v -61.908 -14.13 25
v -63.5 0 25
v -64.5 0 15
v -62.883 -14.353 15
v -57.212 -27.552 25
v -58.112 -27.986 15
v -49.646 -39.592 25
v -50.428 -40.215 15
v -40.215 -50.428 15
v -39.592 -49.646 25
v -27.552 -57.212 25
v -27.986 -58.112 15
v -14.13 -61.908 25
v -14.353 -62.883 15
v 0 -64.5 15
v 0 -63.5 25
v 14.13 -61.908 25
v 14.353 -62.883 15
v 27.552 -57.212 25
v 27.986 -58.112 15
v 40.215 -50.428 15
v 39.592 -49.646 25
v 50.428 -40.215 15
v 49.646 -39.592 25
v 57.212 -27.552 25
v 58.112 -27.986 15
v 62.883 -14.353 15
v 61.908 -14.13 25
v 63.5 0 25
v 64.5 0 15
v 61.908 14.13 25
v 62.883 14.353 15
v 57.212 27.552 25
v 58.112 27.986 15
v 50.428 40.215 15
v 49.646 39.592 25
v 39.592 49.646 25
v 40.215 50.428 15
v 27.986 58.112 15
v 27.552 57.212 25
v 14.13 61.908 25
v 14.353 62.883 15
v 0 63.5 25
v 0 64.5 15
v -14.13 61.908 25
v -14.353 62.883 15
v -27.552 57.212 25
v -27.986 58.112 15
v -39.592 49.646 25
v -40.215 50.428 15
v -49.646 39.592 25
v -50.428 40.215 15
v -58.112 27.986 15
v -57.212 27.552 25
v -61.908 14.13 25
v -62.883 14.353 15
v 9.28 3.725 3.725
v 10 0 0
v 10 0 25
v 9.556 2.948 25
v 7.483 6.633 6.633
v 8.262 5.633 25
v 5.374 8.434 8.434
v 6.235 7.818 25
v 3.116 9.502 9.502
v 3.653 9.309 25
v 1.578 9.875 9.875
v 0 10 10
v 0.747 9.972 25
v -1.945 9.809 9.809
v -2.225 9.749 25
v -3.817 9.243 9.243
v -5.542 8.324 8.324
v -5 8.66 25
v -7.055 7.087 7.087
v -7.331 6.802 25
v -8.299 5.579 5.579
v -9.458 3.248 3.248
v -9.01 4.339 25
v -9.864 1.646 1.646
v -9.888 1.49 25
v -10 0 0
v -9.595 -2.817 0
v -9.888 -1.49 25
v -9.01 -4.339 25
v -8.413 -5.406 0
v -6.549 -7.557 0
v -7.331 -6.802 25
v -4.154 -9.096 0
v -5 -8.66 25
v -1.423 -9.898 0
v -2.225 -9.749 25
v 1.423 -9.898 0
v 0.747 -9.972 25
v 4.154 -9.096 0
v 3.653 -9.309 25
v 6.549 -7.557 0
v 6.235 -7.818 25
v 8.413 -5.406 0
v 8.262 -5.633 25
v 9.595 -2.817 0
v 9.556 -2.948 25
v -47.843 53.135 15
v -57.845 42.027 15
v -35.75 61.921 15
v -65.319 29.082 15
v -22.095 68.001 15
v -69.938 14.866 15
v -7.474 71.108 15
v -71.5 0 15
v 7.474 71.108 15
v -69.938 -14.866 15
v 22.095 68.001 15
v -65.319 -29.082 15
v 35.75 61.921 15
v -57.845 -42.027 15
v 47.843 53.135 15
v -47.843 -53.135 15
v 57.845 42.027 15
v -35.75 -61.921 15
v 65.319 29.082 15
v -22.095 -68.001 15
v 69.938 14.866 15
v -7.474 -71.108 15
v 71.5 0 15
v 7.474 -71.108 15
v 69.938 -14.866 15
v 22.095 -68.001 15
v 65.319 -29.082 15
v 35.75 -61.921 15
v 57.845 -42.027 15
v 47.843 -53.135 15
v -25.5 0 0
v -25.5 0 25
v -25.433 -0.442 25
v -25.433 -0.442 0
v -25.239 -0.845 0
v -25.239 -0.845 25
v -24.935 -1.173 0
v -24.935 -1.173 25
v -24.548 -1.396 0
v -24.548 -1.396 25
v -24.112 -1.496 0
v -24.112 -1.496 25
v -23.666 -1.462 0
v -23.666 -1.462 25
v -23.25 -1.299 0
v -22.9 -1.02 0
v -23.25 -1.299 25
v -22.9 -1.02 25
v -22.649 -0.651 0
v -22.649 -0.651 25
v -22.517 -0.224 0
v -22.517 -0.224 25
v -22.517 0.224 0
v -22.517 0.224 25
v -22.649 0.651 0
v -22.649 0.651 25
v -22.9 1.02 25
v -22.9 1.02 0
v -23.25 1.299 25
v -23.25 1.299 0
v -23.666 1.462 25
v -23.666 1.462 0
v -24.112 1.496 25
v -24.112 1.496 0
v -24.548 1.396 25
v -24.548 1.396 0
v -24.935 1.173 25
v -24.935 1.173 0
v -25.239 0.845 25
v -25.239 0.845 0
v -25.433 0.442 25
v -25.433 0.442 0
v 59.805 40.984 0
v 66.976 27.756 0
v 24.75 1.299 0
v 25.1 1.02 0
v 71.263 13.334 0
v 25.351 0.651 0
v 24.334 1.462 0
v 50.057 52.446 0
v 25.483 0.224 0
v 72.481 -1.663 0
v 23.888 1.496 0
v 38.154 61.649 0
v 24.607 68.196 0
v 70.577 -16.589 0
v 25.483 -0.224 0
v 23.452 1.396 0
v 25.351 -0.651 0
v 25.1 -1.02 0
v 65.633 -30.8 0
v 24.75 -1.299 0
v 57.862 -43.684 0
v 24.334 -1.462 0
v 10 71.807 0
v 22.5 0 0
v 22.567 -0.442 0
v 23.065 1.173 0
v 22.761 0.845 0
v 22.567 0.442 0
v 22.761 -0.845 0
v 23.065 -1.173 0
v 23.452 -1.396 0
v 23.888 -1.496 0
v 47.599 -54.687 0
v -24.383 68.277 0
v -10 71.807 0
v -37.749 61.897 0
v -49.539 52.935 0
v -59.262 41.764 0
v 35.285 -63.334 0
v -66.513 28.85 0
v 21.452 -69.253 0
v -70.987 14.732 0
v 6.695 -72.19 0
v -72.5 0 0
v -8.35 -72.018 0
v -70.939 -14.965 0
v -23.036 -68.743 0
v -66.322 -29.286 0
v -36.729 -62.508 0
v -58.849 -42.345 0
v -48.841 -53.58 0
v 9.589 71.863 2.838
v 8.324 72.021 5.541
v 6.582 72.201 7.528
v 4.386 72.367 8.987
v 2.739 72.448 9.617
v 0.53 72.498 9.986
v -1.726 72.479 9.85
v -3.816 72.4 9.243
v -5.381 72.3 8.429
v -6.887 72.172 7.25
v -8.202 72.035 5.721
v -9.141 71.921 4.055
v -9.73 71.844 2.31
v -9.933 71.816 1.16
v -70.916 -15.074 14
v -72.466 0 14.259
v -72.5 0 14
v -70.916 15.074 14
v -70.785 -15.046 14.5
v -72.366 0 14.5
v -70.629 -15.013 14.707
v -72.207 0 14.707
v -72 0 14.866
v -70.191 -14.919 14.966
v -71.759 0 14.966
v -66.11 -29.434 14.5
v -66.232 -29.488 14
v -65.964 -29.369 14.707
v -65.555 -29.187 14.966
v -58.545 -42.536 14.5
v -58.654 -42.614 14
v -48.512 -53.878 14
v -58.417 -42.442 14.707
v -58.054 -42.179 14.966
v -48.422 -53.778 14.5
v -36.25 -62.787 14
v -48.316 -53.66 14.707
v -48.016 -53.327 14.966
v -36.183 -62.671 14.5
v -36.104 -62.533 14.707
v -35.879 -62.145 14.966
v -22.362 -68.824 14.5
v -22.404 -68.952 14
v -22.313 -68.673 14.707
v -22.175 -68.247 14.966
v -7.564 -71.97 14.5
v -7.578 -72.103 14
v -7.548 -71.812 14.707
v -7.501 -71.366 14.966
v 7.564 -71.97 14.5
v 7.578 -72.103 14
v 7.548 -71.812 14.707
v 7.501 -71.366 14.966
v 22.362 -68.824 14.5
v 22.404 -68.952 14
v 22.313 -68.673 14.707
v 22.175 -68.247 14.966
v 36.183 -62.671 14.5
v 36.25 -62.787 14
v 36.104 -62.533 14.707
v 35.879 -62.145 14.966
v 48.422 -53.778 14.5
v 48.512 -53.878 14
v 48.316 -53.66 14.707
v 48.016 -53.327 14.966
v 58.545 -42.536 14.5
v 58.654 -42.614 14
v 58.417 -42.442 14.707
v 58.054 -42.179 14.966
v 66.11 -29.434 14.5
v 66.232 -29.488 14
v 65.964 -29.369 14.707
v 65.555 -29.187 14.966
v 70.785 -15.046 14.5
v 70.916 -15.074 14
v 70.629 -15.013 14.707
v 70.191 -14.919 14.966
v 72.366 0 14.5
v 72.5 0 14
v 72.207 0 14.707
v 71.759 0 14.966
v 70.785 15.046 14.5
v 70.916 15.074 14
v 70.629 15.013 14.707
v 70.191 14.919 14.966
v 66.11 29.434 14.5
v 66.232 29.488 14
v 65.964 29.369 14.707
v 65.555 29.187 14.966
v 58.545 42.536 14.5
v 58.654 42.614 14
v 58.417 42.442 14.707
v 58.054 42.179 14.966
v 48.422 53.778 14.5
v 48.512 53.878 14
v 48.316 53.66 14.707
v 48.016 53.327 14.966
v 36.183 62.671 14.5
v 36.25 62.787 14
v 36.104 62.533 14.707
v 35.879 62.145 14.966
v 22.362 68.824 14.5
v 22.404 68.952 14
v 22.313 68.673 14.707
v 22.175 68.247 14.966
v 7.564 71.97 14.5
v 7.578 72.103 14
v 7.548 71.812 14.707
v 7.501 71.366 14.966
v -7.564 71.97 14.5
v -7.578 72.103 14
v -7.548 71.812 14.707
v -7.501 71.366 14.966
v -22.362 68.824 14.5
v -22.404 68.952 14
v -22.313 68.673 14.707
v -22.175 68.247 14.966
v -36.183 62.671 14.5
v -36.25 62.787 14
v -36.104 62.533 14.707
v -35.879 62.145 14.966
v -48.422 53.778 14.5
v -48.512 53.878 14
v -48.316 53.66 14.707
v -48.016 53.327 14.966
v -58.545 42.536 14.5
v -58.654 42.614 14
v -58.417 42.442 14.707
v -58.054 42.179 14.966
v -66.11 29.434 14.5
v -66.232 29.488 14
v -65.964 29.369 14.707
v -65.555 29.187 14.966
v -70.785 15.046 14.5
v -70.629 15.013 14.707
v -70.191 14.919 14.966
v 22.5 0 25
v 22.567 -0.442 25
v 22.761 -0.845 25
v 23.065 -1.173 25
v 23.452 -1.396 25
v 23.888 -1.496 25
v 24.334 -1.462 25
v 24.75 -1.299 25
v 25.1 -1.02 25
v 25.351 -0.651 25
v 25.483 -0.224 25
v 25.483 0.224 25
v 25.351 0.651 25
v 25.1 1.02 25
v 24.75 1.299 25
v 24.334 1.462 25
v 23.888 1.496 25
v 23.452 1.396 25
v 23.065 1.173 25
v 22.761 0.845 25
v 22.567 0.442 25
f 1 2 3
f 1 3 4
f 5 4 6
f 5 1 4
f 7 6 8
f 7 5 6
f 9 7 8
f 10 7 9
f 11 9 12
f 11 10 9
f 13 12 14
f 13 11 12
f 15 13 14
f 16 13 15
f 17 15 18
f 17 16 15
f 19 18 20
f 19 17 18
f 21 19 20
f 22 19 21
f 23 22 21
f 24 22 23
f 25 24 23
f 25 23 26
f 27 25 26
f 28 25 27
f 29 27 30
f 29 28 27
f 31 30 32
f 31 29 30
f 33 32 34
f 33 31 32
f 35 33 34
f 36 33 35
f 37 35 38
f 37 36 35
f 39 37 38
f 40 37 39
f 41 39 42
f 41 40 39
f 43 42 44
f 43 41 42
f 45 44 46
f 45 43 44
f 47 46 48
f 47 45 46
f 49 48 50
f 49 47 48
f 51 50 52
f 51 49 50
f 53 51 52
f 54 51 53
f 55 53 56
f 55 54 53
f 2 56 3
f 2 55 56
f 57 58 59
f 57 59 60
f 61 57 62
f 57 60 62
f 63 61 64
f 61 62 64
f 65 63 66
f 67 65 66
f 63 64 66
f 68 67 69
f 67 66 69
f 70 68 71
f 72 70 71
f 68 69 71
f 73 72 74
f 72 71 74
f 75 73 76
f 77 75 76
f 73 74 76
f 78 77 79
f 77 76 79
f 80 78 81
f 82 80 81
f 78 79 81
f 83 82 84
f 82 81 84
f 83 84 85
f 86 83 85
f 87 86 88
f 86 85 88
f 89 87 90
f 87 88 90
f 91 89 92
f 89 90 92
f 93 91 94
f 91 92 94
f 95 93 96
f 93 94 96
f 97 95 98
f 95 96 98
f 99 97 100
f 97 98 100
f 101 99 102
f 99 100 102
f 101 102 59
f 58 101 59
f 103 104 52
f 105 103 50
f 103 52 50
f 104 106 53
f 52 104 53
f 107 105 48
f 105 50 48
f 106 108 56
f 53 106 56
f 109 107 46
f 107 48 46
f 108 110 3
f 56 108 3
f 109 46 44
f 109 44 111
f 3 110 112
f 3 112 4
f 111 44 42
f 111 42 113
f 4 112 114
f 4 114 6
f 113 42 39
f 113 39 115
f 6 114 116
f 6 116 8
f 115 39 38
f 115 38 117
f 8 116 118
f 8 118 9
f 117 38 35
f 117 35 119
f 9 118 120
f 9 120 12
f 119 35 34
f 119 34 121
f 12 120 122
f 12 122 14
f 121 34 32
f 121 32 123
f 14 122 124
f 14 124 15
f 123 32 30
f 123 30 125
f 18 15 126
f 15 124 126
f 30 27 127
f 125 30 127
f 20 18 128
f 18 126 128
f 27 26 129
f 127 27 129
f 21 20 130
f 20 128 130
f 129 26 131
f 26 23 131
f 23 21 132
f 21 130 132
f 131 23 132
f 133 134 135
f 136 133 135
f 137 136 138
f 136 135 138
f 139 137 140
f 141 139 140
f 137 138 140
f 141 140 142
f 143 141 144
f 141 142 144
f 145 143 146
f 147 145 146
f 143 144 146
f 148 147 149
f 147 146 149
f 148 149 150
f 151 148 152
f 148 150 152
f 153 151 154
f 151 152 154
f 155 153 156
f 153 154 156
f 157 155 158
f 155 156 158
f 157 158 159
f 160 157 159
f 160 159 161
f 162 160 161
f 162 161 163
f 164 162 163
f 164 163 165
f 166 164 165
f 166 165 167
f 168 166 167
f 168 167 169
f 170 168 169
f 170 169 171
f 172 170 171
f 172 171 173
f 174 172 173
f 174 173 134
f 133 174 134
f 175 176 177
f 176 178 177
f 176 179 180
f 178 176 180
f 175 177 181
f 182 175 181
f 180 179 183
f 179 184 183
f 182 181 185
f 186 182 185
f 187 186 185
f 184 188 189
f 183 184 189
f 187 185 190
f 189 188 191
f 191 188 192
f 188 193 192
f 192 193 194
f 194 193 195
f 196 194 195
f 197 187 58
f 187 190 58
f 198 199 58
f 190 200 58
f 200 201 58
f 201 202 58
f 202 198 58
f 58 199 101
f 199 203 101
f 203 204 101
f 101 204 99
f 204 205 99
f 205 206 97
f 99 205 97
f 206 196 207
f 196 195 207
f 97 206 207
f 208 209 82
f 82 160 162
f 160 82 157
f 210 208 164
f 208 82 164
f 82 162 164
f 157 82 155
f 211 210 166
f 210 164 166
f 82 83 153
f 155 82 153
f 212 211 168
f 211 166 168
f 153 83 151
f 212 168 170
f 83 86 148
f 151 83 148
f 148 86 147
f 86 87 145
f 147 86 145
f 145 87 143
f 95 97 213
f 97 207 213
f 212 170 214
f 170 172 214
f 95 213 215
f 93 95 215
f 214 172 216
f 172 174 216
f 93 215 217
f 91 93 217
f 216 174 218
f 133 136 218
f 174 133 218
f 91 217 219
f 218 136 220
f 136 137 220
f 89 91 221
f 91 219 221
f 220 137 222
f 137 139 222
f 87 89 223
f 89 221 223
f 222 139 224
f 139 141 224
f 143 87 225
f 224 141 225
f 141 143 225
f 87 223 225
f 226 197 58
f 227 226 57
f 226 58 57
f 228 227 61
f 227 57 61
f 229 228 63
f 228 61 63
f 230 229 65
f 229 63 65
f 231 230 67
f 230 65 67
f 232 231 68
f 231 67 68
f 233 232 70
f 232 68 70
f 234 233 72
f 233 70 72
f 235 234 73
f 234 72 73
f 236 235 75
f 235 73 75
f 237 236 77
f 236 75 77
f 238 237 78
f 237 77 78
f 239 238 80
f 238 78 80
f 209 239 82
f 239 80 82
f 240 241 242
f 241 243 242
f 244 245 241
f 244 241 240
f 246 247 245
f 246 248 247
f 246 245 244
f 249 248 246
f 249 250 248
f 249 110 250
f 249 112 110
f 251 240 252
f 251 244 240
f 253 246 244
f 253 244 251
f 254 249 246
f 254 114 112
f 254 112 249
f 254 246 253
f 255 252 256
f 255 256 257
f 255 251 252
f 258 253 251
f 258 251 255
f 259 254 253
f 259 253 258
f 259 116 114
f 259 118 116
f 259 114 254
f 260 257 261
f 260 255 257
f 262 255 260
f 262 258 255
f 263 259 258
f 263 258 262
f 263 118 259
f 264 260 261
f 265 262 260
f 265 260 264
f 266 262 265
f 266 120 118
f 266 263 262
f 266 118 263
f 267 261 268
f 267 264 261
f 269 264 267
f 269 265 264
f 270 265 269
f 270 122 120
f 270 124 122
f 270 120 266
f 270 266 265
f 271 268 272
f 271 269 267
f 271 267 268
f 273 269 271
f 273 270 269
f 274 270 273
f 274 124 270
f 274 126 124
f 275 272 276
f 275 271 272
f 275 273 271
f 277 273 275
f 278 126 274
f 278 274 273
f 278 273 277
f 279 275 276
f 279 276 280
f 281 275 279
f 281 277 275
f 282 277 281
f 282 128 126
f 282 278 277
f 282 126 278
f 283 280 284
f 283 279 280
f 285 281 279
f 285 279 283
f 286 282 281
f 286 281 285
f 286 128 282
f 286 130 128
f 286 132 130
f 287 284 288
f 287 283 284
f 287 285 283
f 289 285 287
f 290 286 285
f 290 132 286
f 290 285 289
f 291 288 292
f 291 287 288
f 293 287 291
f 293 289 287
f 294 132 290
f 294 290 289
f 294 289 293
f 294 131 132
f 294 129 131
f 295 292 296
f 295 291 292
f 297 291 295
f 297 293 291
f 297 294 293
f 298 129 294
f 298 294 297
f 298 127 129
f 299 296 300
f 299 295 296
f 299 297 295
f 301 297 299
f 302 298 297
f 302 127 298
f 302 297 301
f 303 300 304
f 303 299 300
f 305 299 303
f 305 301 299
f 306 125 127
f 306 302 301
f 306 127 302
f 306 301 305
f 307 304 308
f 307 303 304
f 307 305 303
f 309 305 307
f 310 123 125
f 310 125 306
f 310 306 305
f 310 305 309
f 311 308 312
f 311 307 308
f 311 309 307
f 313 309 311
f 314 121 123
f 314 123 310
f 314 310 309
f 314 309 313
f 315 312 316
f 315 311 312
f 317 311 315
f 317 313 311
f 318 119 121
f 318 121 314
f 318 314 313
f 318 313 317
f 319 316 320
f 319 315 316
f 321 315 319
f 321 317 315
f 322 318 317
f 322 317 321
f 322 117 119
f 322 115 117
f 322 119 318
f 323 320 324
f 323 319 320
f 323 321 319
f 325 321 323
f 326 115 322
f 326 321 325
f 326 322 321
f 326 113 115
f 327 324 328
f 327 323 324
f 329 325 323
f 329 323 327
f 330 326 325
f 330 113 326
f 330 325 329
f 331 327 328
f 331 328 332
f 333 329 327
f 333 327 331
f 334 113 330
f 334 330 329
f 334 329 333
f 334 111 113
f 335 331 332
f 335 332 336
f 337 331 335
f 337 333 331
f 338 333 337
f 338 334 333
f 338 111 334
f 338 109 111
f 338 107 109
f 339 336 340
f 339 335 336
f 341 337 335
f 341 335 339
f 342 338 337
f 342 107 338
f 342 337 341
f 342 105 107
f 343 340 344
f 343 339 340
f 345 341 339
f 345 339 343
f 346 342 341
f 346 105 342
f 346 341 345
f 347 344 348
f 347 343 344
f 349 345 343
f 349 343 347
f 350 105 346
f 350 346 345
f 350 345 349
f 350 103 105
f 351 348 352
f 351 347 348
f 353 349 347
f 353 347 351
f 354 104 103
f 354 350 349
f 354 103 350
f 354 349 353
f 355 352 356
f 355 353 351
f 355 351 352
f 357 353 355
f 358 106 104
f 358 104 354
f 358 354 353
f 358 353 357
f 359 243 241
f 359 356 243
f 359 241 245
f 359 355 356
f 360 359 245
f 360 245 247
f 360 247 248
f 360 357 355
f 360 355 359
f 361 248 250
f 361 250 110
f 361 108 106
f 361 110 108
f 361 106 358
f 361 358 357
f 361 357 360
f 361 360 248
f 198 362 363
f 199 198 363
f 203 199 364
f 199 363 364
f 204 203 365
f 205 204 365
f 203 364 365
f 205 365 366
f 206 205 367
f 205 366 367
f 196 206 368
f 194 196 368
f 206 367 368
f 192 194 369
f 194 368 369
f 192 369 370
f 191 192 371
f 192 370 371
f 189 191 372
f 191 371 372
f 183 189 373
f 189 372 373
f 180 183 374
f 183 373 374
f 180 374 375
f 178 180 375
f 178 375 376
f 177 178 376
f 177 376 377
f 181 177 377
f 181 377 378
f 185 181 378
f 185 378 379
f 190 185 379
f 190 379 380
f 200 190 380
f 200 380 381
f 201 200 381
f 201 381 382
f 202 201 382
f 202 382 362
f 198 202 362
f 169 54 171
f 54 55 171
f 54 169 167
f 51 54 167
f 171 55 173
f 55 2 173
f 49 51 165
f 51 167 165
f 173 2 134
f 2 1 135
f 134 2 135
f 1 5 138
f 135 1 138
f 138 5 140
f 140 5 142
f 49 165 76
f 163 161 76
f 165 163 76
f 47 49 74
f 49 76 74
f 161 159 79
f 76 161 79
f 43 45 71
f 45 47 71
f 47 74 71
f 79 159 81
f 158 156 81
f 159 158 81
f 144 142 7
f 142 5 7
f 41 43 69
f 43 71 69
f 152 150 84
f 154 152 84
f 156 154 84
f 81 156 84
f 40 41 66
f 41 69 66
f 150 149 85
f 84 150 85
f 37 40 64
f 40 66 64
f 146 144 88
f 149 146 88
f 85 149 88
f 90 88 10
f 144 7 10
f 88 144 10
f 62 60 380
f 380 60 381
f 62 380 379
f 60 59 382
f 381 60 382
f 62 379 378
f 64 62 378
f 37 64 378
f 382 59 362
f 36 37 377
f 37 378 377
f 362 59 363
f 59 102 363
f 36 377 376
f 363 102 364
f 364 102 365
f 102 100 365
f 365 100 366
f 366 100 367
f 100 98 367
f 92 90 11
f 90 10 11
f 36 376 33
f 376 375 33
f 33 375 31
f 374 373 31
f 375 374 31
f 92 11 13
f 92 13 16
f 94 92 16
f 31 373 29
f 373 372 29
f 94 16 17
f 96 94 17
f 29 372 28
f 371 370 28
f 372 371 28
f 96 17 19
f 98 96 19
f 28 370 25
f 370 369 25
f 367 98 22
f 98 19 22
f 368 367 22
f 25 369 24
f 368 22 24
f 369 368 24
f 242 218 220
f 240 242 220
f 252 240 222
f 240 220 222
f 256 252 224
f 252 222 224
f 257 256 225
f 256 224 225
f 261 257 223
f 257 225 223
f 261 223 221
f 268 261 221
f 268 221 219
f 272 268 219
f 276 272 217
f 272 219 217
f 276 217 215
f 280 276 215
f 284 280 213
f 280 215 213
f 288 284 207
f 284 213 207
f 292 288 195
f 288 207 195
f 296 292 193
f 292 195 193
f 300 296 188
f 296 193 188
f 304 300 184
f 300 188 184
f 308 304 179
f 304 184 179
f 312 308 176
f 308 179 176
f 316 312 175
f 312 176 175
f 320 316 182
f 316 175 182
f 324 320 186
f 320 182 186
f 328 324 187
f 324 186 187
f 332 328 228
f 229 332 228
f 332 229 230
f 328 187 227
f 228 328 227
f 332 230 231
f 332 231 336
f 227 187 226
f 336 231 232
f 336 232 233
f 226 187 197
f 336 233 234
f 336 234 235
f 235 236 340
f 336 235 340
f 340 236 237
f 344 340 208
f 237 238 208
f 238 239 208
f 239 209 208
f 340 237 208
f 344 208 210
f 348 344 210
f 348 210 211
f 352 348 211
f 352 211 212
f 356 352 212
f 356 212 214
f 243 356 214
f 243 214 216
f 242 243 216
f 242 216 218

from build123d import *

# Parameters (mm, degrees)
F0_W     = 10
F0_H     = 18.0418604054
F0_H_2   = 25
F0_H_3   = 6.9581395946
F3_R     = 10
F4_DEPTH = 141.6
F5_R     = 1
F6_SIZE2 = 0.99999
F6_SIZE  = 9.99999
F8_D     = 3
F9_D     = 3


# Not quite as in the source:
# - a fillet or chamfer is up to 0.001 mm smaller than in the source, because OpenCascade refuses the exact size


with BuildPart() as f1:
    # F0 (on Front) → F1 (revolve)
    with BuildSketch(Plane.XZ):
        Polygon((-72.5, 15), (-72.5, 0), (0, 0), (0, 25), (-64.5, 25), (-64.5, 15), align=None)
    revolve(axis=Axis((0, 0, 12.5), (0, 0, 1)))

    # F0 (on Front) → F2 (revolve, cut)
    with BuildSketch(Plane.XZ):
        with Locations((5, 34.0209302027)):
            Rectangle(F0_W, F0_H)
        with Locations((5, 12.5)):
            Rectangle(F0_W, F0_H_2)
        with Locations((5, -3.4790697973)):
            Rectangle(F0_W, F0_H_3)
    revolve(axis=Axis((0, 0, 18.0418604054), (0, 0, 1)), mode=Mode.SUBTRACT)

    # F3 (on Front) → F4 (cut)
    with BuildSketch(Plane.XZ):
        Circle(F3_R)
    extrude(amount=-F4_DEPTH, mode=Mode.SUBTRACT)

    # F5
    f5_edges = [f1.edges().sort_by_distance(p)[0] for p in [
        (72.5, 0, 15),
    ]]
    fillet(f5_edges, radius=F5_R)

    # F6 (size 10 and 1 in the source; OpenCascade refuses exactly that, so slightly less here)
    f6_edges = [f1.edges().sort_by_distance(p)[0] for p in [
        (64.5, 0, 25),
    ]]
    chamfer(f6_edges, length=F6_SIZE, length2=F6_SIZE2)

    # F8 (through all)
    with Locations(Plane(origin=(0, 0, 0), x_dir=(1, 0, 0), z_dir=(0, 0, -1))):
        with Locations((24, 0)):
            Hole(F8_D / 2)

    # F9 (through all)
    with Locations(Plane(origin=(0, 0, 0), x_dir=(1, 0, 0), z_dir=(0, 0, -1))):
        with Locations((-24, 0)):
            Hole(F9_D / 2)


solid = f1.part
